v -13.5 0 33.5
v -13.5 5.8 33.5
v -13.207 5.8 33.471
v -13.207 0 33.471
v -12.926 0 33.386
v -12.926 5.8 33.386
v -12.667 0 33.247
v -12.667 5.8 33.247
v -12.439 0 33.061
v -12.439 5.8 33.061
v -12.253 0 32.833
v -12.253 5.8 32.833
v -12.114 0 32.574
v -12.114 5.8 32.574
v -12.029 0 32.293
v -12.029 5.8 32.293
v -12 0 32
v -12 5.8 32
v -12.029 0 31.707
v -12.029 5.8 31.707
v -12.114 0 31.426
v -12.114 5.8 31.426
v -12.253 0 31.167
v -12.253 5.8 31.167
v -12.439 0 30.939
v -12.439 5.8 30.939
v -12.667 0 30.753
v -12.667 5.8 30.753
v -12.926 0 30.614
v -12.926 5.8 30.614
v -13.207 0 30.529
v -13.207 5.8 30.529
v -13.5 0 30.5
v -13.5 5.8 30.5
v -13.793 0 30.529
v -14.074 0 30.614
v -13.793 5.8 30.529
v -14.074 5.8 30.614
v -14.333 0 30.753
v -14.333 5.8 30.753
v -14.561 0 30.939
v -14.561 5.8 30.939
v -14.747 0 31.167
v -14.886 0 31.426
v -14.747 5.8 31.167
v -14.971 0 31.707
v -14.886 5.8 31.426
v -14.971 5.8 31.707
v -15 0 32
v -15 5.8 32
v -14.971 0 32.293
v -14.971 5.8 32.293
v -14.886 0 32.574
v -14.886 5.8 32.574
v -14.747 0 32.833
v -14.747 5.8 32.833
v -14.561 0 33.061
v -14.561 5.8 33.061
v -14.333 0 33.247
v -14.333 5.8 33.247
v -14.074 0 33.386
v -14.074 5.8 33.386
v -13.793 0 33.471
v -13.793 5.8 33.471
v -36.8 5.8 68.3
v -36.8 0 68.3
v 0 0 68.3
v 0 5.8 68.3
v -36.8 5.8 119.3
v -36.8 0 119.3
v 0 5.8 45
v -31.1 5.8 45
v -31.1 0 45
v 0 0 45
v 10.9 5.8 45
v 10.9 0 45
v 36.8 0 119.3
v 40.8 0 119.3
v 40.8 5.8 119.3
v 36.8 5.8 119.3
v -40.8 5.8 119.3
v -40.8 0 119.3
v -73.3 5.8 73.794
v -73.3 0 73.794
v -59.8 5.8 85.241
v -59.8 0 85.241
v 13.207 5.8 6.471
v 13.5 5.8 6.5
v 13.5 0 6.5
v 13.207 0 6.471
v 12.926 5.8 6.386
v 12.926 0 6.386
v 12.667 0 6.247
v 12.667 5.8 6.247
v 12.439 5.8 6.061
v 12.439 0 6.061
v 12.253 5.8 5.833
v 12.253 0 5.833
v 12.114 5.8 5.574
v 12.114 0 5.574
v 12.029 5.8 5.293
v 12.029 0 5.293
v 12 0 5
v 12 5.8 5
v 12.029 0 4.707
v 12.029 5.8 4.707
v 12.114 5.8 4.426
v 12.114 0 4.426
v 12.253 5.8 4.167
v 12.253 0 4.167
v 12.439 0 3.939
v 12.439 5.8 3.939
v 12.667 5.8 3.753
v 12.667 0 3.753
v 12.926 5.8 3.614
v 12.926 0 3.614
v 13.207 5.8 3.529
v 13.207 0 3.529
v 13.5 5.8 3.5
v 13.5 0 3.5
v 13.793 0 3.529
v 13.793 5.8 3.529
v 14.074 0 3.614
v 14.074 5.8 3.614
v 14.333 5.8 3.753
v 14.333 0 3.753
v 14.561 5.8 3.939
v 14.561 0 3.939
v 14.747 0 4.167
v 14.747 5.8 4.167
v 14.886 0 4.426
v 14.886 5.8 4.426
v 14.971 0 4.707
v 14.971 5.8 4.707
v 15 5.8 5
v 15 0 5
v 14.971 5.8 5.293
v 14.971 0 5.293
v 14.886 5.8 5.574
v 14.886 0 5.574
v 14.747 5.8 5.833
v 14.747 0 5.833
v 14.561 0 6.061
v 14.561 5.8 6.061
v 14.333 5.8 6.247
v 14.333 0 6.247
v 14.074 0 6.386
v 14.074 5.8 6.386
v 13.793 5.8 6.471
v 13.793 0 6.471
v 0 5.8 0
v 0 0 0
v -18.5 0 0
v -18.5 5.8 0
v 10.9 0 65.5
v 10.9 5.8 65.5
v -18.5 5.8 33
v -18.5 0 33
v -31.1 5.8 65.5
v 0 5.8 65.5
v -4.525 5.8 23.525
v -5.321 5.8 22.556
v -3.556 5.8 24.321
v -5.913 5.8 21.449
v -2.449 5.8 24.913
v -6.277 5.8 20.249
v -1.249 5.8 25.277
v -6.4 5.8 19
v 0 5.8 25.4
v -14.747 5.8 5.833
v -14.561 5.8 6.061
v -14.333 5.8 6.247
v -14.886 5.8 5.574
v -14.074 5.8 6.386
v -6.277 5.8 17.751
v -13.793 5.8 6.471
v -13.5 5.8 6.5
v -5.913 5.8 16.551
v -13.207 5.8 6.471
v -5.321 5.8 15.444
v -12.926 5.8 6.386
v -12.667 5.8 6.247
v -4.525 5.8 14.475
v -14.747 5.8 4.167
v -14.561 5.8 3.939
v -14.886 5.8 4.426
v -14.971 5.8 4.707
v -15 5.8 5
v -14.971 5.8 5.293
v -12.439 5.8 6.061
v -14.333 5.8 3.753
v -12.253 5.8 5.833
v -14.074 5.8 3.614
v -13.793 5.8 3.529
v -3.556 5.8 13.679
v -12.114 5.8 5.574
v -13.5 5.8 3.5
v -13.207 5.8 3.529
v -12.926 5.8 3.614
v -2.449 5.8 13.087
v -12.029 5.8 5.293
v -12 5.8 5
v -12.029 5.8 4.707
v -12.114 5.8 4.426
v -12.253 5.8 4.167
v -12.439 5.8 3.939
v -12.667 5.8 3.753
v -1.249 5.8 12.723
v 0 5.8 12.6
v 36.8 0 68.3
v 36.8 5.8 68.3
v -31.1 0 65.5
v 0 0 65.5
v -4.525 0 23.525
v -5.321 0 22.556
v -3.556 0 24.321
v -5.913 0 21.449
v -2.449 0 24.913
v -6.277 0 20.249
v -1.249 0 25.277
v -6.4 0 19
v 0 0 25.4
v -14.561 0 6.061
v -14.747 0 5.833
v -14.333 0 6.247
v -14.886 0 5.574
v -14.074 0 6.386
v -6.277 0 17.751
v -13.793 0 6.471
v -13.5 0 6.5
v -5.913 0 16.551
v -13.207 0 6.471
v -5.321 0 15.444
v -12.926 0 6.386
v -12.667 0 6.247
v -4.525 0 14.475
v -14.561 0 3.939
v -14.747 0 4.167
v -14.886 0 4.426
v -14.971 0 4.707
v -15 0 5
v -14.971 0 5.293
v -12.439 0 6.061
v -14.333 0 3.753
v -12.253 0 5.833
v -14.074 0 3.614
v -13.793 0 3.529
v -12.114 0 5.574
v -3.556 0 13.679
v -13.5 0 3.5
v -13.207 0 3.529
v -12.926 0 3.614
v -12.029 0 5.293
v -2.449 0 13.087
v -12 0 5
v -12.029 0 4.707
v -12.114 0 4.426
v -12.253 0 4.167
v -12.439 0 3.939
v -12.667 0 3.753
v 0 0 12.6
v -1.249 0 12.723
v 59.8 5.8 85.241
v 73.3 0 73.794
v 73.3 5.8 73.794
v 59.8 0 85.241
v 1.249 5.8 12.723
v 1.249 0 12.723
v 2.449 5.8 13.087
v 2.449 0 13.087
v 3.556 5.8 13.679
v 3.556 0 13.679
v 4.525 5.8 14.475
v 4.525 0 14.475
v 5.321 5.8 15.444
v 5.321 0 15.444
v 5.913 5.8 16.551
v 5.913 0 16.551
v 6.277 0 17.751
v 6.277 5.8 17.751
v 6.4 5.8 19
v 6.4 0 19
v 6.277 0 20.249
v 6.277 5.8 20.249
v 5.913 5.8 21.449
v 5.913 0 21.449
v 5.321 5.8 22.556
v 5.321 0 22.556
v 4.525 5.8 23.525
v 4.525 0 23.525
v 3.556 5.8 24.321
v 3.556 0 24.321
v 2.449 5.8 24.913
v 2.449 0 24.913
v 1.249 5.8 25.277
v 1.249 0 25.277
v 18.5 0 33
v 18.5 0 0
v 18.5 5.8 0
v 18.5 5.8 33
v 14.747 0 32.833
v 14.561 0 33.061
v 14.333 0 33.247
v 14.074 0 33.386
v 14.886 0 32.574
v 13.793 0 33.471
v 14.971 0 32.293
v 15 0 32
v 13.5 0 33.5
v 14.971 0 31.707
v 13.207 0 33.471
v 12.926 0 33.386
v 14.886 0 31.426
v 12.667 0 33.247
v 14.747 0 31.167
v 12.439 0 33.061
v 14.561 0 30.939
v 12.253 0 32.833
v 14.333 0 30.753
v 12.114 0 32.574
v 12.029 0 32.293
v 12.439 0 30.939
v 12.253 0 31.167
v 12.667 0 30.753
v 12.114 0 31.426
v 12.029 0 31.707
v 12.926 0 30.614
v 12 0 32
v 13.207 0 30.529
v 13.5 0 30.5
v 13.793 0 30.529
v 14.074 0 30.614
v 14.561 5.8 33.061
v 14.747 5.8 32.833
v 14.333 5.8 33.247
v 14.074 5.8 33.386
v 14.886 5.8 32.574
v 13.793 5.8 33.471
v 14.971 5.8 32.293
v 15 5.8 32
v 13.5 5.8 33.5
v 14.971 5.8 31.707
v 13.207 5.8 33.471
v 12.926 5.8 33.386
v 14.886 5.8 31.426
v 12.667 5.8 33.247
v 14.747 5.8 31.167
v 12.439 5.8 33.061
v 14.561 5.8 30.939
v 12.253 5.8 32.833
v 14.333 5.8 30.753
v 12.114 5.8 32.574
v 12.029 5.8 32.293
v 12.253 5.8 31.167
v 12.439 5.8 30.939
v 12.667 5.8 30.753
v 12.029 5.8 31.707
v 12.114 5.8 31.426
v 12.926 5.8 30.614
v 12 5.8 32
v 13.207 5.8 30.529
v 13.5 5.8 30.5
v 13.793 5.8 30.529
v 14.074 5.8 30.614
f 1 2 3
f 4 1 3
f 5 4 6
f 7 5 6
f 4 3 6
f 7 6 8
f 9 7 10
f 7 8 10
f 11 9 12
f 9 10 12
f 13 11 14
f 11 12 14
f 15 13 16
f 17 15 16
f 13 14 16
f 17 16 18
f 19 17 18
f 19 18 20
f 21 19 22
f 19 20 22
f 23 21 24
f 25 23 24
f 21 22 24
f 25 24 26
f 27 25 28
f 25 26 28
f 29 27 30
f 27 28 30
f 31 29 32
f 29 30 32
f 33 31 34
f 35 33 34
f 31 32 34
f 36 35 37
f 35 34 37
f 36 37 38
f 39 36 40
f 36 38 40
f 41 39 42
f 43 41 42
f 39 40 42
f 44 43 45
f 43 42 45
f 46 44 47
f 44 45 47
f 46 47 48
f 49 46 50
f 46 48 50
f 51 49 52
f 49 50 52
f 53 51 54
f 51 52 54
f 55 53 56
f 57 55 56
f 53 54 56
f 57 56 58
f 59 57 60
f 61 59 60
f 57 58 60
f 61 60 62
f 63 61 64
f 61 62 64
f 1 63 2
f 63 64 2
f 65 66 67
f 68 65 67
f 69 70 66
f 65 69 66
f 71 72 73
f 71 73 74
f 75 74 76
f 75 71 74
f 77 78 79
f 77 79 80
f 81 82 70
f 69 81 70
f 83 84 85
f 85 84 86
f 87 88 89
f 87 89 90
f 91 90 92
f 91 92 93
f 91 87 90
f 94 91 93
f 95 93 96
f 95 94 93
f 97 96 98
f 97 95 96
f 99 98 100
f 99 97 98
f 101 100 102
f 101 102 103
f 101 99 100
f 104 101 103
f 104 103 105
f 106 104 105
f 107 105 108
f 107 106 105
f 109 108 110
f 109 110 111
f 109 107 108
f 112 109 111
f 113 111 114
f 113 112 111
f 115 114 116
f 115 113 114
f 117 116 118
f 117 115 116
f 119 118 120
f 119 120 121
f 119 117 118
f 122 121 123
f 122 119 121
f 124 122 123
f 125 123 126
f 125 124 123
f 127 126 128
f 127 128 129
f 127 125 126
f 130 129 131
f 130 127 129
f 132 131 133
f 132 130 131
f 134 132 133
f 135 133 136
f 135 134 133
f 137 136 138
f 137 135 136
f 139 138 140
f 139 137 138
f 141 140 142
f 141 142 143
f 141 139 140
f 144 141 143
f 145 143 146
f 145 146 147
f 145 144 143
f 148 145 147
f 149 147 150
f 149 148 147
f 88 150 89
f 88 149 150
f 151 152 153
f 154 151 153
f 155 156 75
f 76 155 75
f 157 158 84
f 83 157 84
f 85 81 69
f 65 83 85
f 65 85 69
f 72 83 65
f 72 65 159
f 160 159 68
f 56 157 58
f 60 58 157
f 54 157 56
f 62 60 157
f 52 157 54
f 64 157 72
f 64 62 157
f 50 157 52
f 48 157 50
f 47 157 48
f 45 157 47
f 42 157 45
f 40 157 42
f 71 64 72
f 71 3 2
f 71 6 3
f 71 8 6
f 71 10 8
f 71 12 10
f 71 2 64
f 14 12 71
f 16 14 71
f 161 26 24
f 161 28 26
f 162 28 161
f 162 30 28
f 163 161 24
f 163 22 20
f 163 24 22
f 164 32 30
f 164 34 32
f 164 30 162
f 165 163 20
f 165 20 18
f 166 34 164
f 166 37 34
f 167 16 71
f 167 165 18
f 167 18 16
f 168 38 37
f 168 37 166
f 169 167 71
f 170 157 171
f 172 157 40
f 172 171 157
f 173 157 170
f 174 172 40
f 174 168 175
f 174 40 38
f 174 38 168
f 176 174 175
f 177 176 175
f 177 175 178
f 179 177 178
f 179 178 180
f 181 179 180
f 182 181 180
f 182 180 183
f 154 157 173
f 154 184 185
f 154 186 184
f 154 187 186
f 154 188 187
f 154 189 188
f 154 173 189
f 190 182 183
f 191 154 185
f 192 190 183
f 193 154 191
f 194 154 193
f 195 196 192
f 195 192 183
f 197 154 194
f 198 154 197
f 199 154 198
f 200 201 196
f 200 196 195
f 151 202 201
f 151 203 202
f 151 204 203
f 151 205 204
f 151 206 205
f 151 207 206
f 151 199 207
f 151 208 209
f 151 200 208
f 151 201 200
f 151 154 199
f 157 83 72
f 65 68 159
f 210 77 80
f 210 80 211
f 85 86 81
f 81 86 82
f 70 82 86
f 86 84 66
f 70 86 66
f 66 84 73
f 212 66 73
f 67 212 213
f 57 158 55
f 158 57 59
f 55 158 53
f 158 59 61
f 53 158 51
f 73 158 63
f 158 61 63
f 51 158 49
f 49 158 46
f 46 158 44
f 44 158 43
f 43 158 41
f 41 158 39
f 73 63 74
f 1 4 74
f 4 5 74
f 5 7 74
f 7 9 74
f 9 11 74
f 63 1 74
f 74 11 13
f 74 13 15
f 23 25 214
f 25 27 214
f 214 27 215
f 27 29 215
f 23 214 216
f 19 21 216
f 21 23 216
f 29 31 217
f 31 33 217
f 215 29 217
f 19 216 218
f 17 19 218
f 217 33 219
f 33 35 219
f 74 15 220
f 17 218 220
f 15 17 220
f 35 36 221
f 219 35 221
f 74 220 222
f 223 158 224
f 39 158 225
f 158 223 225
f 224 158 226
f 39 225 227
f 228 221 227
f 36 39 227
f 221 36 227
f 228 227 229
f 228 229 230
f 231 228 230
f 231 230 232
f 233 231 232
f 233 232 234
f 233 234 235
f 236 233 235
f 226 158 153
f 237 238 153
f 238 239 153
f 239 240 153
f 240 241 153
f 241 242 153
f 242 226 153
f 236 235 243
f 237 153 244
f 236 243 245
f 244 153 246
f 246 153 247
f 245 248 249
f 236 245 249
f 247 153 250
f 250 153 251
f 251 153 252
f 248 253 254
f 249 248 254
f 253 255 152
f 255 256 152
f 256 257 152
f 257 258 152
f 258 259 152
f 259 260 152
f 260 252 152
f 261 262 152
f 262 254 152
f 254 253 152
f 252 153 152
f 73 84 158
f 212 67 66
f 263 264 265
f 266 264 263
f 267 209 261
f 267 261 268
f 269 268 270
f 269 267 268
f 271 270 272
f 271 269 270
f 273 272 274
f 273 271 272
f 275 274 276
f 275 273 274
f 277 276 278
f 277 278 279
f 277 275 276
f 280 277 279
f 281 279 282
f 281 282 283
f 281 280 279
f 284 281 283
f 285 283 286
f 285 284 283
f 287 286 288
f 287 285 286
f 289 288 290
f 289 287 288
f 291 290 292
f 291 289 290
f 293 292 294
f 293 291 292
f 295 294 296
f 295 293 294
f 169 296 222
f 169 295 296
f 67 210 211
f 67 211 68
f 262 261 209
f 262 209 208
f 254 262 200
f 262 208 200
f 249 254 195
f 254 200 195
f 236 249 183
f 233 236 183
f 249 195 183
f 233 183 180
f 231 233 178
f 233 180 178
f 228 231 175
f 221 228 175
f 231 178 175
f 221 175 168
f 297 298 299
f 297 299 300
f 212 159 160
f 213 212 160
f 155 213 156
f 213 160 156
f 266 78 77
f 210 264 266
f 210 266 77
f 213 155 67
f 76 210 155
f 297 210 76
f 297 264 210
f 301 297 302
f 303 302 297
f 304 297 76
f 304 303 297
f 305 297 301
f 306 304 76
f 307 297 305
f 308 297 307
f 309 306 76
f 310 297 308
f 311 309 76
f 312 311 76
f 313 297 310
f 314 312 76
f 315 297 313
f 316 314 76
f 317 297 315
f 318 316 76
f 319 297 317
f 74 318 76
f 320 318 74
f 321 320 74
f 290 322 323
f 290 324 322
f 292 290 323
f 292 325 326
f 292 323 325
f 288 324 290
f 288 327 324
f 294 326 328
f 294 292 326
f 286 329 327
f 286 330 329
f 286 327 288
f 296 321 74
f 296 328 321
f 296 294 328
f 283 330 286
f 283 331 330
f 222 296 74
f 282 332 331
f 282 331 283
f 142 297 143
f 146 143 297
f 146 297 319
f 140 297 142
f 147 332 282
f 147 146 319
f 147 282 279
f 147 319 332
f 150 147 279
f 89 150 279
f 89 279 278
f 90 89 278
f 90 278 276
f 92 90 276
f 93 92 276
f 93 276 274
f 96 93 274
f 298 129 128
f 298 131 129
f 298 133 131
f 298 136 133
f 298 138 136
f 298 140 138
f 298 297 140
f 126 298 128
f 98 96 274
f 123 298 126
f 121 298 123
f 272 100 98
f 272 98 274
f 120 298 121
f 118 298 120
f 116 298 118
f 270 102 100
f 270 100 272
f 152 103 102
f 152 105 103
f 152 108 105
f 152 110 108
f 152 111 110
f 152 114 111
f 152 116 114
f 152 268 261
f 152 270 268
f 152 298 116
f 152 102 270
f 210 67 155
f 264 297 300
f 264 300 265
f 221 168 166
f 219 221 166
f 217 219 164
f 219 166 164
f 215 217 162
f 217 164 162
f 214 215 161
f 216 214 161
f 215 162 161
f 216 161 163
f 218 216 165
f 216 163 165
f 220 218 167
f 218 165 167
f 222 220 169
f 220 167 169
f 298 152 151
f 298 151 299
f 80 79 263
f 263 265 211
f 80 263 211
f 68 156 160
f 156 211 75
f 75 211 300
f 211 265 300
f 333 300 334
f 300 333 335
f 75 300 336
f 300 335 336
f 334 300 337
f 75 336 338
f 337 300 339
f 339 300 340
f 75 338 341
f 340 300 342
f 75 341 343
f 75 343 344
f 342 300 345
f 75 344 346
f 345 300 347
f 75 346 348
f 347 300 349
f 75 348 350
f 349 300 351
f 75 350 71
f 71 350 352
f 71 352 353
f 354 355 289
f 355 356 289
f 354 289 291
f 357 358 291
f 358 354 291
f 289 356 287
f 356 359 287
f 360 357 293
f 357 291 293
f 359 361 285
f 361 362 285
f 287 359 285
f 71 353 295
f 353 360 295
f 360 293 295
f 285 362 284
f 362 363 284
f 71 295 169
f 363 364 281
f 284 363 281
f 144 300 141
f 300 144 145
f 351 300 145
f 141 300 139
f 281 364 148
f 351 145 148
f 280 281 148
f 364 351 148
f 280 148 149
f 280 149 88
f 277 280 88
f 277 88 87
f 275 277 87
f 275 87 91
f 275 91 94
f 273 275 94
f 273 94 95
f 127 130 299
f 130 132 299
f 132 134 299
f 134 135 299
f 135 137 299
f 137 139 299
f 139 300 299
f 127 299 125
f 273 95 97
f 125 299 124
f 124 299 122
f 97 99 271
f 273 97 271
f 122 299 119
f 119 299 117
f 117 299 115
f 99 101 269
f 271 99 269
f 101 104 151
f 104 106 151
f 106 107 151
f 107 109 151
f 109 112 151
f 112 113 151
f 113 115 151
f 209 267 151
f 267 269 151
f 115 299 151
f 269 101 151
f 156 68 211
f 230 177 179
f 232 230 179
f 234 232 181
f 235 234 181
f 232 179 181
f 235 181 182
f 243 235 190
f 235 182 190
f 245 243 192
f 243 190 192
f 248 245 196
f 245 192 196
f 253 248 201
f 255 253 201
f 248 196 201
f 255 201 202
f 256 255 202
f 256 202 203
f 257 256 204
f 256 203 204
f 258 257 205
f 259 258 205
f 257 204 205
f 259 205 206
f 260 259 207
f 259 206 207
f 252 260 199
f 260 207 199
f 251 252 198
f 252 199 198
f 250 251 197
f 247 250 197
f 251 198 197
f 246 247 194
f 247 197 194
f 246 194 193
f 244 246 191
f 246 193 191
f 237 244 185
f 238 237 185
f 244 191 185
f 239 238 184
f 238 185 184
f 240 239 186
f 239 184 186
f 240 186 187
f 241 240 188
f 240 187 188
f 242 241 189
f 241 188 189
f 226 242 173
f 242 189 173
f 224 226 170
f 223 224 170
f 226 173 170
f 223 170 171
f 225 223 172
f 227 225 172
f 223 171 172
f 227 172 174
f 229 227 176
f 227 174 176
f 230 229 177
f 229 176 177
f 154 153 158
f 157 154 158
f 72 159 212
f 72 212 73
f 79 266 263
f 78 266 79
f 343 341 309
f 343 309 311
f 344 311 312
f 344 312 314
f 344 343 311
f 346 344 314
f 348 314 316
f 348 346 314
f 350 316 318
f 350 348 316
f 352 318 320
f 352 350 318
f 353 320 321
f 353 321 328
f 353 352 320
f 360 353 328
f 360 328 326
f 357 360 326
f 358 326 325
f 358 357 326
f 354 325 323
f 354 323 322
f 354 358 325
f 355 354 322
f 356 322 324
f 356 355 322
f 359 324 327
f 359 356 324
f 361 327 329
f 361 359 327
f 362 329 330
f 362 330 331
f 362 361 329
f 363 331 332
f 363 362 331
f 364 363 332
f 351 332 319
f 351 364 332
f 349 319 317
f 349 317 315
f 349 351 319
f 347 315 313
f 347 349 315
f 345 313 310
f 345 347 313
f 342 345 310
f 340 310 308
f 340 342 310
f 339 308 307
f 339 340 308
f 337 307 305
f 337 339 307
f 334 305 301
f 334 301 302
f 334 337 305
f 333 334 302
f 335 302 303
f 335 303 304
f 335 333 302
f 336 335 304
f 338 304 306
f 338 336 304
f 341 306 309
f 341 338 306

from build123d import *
from build123d.topology import SkipClean

# Parameters (mm, degrees)
BOSS_EXTRU_1_DEPTH      = 5.8
ESQUISSE2_R             = 1.5
ESQUISSE2_R_2           = 6.4
ENL_V_MAT_EXTRU_1_DEPTH = 5.8
ESQUISSE3_W             = 42
ESQUISSE3_H             = 20.5
ENL_V_MAT_EXTRU_2_DEPTH = 5.8


with BuildPart() as part:
    # Esquisse1 → Boss.-Extru.1 (new body)
    with BuildSketch(Plane(origin=(0, 0, 0), x_dir=(1, 0, 0), z_dir=(0, 1, 0))):
        Polygon((0, 0), (-18.5, 0), (-18.5, -33), (-73.3, -73.793956851), (-59.8, -85.241227268), (-40.8, -119.3), (-36.8, -119.3), (-36.8, -68.3), (0, -68.3), align=None)
    boss_extru_1 = extrude(amount=BOSS_EXTRU_1_DEPTH)

    # Esquisse2 → Enlèv. mat.-Extru.1 (cut)
    with BuildSketch(Plane(origin=(0, 5.8, 0), x_dir=(1, 0, 0), z_dir=(0, 1, 0))):
        with Locations(Location((-13.5, -5, 0), (0, 0, 270))):
            Circle(ESQUISSE2_R)
        with Locations((0, -19)):
            Circle(ESQUISSE2_R_2)
        with Locations(Location((-13.5, -32, 0), (0, 0, 270))):
            Circle(ESQUISSE2_R)
    enl_v_mat_extru_1 = extrude(amount=-ENL_V_MAT_EXTRU_1_DEPTH, mode=Mode.SUBTRACT)

    # Symétrie2: Boss.-Extru.1, Enlèv. mat.-Extru.1 across plane
    with SkipClean():  # the faces are left unmerged after this step: merging them gives an invalid solid
        add(boss_extru_1.mirror(Plane(origin=(0, 5.8, 68.3), x_dir=(0, 0, 1), z_dir=(-1, 0, 0))))
        add(enl_v_mat_extru_1.mirror(Plane(origin=(0, 5.8, 68.3), x_dir=(0, 0, 1), z_dir=(-1, 0, 0))), mode=Mode.SUBTRACT)

    # Esquisse3 → Enlèv. mat.-Extru.2 (cut)
    with SkipClean():  # the faces are left unmerged after this step: merging them gives an invalid solid
        with BuildSketch(Plane(origin=(0, 5.8, 0), x_dir=(1, 0, 0), z_dir=(0, 1, 0))):
            with Locations((-10.1, -55.25)):
                Rectangle(ESQUISSE3_W, ESQUISSE3_H)
        extrude(amount=-ENL_V_MAT_EXTRU_2_DEPTH, mode=Mode.SUBTRACT)


solid = part.part
